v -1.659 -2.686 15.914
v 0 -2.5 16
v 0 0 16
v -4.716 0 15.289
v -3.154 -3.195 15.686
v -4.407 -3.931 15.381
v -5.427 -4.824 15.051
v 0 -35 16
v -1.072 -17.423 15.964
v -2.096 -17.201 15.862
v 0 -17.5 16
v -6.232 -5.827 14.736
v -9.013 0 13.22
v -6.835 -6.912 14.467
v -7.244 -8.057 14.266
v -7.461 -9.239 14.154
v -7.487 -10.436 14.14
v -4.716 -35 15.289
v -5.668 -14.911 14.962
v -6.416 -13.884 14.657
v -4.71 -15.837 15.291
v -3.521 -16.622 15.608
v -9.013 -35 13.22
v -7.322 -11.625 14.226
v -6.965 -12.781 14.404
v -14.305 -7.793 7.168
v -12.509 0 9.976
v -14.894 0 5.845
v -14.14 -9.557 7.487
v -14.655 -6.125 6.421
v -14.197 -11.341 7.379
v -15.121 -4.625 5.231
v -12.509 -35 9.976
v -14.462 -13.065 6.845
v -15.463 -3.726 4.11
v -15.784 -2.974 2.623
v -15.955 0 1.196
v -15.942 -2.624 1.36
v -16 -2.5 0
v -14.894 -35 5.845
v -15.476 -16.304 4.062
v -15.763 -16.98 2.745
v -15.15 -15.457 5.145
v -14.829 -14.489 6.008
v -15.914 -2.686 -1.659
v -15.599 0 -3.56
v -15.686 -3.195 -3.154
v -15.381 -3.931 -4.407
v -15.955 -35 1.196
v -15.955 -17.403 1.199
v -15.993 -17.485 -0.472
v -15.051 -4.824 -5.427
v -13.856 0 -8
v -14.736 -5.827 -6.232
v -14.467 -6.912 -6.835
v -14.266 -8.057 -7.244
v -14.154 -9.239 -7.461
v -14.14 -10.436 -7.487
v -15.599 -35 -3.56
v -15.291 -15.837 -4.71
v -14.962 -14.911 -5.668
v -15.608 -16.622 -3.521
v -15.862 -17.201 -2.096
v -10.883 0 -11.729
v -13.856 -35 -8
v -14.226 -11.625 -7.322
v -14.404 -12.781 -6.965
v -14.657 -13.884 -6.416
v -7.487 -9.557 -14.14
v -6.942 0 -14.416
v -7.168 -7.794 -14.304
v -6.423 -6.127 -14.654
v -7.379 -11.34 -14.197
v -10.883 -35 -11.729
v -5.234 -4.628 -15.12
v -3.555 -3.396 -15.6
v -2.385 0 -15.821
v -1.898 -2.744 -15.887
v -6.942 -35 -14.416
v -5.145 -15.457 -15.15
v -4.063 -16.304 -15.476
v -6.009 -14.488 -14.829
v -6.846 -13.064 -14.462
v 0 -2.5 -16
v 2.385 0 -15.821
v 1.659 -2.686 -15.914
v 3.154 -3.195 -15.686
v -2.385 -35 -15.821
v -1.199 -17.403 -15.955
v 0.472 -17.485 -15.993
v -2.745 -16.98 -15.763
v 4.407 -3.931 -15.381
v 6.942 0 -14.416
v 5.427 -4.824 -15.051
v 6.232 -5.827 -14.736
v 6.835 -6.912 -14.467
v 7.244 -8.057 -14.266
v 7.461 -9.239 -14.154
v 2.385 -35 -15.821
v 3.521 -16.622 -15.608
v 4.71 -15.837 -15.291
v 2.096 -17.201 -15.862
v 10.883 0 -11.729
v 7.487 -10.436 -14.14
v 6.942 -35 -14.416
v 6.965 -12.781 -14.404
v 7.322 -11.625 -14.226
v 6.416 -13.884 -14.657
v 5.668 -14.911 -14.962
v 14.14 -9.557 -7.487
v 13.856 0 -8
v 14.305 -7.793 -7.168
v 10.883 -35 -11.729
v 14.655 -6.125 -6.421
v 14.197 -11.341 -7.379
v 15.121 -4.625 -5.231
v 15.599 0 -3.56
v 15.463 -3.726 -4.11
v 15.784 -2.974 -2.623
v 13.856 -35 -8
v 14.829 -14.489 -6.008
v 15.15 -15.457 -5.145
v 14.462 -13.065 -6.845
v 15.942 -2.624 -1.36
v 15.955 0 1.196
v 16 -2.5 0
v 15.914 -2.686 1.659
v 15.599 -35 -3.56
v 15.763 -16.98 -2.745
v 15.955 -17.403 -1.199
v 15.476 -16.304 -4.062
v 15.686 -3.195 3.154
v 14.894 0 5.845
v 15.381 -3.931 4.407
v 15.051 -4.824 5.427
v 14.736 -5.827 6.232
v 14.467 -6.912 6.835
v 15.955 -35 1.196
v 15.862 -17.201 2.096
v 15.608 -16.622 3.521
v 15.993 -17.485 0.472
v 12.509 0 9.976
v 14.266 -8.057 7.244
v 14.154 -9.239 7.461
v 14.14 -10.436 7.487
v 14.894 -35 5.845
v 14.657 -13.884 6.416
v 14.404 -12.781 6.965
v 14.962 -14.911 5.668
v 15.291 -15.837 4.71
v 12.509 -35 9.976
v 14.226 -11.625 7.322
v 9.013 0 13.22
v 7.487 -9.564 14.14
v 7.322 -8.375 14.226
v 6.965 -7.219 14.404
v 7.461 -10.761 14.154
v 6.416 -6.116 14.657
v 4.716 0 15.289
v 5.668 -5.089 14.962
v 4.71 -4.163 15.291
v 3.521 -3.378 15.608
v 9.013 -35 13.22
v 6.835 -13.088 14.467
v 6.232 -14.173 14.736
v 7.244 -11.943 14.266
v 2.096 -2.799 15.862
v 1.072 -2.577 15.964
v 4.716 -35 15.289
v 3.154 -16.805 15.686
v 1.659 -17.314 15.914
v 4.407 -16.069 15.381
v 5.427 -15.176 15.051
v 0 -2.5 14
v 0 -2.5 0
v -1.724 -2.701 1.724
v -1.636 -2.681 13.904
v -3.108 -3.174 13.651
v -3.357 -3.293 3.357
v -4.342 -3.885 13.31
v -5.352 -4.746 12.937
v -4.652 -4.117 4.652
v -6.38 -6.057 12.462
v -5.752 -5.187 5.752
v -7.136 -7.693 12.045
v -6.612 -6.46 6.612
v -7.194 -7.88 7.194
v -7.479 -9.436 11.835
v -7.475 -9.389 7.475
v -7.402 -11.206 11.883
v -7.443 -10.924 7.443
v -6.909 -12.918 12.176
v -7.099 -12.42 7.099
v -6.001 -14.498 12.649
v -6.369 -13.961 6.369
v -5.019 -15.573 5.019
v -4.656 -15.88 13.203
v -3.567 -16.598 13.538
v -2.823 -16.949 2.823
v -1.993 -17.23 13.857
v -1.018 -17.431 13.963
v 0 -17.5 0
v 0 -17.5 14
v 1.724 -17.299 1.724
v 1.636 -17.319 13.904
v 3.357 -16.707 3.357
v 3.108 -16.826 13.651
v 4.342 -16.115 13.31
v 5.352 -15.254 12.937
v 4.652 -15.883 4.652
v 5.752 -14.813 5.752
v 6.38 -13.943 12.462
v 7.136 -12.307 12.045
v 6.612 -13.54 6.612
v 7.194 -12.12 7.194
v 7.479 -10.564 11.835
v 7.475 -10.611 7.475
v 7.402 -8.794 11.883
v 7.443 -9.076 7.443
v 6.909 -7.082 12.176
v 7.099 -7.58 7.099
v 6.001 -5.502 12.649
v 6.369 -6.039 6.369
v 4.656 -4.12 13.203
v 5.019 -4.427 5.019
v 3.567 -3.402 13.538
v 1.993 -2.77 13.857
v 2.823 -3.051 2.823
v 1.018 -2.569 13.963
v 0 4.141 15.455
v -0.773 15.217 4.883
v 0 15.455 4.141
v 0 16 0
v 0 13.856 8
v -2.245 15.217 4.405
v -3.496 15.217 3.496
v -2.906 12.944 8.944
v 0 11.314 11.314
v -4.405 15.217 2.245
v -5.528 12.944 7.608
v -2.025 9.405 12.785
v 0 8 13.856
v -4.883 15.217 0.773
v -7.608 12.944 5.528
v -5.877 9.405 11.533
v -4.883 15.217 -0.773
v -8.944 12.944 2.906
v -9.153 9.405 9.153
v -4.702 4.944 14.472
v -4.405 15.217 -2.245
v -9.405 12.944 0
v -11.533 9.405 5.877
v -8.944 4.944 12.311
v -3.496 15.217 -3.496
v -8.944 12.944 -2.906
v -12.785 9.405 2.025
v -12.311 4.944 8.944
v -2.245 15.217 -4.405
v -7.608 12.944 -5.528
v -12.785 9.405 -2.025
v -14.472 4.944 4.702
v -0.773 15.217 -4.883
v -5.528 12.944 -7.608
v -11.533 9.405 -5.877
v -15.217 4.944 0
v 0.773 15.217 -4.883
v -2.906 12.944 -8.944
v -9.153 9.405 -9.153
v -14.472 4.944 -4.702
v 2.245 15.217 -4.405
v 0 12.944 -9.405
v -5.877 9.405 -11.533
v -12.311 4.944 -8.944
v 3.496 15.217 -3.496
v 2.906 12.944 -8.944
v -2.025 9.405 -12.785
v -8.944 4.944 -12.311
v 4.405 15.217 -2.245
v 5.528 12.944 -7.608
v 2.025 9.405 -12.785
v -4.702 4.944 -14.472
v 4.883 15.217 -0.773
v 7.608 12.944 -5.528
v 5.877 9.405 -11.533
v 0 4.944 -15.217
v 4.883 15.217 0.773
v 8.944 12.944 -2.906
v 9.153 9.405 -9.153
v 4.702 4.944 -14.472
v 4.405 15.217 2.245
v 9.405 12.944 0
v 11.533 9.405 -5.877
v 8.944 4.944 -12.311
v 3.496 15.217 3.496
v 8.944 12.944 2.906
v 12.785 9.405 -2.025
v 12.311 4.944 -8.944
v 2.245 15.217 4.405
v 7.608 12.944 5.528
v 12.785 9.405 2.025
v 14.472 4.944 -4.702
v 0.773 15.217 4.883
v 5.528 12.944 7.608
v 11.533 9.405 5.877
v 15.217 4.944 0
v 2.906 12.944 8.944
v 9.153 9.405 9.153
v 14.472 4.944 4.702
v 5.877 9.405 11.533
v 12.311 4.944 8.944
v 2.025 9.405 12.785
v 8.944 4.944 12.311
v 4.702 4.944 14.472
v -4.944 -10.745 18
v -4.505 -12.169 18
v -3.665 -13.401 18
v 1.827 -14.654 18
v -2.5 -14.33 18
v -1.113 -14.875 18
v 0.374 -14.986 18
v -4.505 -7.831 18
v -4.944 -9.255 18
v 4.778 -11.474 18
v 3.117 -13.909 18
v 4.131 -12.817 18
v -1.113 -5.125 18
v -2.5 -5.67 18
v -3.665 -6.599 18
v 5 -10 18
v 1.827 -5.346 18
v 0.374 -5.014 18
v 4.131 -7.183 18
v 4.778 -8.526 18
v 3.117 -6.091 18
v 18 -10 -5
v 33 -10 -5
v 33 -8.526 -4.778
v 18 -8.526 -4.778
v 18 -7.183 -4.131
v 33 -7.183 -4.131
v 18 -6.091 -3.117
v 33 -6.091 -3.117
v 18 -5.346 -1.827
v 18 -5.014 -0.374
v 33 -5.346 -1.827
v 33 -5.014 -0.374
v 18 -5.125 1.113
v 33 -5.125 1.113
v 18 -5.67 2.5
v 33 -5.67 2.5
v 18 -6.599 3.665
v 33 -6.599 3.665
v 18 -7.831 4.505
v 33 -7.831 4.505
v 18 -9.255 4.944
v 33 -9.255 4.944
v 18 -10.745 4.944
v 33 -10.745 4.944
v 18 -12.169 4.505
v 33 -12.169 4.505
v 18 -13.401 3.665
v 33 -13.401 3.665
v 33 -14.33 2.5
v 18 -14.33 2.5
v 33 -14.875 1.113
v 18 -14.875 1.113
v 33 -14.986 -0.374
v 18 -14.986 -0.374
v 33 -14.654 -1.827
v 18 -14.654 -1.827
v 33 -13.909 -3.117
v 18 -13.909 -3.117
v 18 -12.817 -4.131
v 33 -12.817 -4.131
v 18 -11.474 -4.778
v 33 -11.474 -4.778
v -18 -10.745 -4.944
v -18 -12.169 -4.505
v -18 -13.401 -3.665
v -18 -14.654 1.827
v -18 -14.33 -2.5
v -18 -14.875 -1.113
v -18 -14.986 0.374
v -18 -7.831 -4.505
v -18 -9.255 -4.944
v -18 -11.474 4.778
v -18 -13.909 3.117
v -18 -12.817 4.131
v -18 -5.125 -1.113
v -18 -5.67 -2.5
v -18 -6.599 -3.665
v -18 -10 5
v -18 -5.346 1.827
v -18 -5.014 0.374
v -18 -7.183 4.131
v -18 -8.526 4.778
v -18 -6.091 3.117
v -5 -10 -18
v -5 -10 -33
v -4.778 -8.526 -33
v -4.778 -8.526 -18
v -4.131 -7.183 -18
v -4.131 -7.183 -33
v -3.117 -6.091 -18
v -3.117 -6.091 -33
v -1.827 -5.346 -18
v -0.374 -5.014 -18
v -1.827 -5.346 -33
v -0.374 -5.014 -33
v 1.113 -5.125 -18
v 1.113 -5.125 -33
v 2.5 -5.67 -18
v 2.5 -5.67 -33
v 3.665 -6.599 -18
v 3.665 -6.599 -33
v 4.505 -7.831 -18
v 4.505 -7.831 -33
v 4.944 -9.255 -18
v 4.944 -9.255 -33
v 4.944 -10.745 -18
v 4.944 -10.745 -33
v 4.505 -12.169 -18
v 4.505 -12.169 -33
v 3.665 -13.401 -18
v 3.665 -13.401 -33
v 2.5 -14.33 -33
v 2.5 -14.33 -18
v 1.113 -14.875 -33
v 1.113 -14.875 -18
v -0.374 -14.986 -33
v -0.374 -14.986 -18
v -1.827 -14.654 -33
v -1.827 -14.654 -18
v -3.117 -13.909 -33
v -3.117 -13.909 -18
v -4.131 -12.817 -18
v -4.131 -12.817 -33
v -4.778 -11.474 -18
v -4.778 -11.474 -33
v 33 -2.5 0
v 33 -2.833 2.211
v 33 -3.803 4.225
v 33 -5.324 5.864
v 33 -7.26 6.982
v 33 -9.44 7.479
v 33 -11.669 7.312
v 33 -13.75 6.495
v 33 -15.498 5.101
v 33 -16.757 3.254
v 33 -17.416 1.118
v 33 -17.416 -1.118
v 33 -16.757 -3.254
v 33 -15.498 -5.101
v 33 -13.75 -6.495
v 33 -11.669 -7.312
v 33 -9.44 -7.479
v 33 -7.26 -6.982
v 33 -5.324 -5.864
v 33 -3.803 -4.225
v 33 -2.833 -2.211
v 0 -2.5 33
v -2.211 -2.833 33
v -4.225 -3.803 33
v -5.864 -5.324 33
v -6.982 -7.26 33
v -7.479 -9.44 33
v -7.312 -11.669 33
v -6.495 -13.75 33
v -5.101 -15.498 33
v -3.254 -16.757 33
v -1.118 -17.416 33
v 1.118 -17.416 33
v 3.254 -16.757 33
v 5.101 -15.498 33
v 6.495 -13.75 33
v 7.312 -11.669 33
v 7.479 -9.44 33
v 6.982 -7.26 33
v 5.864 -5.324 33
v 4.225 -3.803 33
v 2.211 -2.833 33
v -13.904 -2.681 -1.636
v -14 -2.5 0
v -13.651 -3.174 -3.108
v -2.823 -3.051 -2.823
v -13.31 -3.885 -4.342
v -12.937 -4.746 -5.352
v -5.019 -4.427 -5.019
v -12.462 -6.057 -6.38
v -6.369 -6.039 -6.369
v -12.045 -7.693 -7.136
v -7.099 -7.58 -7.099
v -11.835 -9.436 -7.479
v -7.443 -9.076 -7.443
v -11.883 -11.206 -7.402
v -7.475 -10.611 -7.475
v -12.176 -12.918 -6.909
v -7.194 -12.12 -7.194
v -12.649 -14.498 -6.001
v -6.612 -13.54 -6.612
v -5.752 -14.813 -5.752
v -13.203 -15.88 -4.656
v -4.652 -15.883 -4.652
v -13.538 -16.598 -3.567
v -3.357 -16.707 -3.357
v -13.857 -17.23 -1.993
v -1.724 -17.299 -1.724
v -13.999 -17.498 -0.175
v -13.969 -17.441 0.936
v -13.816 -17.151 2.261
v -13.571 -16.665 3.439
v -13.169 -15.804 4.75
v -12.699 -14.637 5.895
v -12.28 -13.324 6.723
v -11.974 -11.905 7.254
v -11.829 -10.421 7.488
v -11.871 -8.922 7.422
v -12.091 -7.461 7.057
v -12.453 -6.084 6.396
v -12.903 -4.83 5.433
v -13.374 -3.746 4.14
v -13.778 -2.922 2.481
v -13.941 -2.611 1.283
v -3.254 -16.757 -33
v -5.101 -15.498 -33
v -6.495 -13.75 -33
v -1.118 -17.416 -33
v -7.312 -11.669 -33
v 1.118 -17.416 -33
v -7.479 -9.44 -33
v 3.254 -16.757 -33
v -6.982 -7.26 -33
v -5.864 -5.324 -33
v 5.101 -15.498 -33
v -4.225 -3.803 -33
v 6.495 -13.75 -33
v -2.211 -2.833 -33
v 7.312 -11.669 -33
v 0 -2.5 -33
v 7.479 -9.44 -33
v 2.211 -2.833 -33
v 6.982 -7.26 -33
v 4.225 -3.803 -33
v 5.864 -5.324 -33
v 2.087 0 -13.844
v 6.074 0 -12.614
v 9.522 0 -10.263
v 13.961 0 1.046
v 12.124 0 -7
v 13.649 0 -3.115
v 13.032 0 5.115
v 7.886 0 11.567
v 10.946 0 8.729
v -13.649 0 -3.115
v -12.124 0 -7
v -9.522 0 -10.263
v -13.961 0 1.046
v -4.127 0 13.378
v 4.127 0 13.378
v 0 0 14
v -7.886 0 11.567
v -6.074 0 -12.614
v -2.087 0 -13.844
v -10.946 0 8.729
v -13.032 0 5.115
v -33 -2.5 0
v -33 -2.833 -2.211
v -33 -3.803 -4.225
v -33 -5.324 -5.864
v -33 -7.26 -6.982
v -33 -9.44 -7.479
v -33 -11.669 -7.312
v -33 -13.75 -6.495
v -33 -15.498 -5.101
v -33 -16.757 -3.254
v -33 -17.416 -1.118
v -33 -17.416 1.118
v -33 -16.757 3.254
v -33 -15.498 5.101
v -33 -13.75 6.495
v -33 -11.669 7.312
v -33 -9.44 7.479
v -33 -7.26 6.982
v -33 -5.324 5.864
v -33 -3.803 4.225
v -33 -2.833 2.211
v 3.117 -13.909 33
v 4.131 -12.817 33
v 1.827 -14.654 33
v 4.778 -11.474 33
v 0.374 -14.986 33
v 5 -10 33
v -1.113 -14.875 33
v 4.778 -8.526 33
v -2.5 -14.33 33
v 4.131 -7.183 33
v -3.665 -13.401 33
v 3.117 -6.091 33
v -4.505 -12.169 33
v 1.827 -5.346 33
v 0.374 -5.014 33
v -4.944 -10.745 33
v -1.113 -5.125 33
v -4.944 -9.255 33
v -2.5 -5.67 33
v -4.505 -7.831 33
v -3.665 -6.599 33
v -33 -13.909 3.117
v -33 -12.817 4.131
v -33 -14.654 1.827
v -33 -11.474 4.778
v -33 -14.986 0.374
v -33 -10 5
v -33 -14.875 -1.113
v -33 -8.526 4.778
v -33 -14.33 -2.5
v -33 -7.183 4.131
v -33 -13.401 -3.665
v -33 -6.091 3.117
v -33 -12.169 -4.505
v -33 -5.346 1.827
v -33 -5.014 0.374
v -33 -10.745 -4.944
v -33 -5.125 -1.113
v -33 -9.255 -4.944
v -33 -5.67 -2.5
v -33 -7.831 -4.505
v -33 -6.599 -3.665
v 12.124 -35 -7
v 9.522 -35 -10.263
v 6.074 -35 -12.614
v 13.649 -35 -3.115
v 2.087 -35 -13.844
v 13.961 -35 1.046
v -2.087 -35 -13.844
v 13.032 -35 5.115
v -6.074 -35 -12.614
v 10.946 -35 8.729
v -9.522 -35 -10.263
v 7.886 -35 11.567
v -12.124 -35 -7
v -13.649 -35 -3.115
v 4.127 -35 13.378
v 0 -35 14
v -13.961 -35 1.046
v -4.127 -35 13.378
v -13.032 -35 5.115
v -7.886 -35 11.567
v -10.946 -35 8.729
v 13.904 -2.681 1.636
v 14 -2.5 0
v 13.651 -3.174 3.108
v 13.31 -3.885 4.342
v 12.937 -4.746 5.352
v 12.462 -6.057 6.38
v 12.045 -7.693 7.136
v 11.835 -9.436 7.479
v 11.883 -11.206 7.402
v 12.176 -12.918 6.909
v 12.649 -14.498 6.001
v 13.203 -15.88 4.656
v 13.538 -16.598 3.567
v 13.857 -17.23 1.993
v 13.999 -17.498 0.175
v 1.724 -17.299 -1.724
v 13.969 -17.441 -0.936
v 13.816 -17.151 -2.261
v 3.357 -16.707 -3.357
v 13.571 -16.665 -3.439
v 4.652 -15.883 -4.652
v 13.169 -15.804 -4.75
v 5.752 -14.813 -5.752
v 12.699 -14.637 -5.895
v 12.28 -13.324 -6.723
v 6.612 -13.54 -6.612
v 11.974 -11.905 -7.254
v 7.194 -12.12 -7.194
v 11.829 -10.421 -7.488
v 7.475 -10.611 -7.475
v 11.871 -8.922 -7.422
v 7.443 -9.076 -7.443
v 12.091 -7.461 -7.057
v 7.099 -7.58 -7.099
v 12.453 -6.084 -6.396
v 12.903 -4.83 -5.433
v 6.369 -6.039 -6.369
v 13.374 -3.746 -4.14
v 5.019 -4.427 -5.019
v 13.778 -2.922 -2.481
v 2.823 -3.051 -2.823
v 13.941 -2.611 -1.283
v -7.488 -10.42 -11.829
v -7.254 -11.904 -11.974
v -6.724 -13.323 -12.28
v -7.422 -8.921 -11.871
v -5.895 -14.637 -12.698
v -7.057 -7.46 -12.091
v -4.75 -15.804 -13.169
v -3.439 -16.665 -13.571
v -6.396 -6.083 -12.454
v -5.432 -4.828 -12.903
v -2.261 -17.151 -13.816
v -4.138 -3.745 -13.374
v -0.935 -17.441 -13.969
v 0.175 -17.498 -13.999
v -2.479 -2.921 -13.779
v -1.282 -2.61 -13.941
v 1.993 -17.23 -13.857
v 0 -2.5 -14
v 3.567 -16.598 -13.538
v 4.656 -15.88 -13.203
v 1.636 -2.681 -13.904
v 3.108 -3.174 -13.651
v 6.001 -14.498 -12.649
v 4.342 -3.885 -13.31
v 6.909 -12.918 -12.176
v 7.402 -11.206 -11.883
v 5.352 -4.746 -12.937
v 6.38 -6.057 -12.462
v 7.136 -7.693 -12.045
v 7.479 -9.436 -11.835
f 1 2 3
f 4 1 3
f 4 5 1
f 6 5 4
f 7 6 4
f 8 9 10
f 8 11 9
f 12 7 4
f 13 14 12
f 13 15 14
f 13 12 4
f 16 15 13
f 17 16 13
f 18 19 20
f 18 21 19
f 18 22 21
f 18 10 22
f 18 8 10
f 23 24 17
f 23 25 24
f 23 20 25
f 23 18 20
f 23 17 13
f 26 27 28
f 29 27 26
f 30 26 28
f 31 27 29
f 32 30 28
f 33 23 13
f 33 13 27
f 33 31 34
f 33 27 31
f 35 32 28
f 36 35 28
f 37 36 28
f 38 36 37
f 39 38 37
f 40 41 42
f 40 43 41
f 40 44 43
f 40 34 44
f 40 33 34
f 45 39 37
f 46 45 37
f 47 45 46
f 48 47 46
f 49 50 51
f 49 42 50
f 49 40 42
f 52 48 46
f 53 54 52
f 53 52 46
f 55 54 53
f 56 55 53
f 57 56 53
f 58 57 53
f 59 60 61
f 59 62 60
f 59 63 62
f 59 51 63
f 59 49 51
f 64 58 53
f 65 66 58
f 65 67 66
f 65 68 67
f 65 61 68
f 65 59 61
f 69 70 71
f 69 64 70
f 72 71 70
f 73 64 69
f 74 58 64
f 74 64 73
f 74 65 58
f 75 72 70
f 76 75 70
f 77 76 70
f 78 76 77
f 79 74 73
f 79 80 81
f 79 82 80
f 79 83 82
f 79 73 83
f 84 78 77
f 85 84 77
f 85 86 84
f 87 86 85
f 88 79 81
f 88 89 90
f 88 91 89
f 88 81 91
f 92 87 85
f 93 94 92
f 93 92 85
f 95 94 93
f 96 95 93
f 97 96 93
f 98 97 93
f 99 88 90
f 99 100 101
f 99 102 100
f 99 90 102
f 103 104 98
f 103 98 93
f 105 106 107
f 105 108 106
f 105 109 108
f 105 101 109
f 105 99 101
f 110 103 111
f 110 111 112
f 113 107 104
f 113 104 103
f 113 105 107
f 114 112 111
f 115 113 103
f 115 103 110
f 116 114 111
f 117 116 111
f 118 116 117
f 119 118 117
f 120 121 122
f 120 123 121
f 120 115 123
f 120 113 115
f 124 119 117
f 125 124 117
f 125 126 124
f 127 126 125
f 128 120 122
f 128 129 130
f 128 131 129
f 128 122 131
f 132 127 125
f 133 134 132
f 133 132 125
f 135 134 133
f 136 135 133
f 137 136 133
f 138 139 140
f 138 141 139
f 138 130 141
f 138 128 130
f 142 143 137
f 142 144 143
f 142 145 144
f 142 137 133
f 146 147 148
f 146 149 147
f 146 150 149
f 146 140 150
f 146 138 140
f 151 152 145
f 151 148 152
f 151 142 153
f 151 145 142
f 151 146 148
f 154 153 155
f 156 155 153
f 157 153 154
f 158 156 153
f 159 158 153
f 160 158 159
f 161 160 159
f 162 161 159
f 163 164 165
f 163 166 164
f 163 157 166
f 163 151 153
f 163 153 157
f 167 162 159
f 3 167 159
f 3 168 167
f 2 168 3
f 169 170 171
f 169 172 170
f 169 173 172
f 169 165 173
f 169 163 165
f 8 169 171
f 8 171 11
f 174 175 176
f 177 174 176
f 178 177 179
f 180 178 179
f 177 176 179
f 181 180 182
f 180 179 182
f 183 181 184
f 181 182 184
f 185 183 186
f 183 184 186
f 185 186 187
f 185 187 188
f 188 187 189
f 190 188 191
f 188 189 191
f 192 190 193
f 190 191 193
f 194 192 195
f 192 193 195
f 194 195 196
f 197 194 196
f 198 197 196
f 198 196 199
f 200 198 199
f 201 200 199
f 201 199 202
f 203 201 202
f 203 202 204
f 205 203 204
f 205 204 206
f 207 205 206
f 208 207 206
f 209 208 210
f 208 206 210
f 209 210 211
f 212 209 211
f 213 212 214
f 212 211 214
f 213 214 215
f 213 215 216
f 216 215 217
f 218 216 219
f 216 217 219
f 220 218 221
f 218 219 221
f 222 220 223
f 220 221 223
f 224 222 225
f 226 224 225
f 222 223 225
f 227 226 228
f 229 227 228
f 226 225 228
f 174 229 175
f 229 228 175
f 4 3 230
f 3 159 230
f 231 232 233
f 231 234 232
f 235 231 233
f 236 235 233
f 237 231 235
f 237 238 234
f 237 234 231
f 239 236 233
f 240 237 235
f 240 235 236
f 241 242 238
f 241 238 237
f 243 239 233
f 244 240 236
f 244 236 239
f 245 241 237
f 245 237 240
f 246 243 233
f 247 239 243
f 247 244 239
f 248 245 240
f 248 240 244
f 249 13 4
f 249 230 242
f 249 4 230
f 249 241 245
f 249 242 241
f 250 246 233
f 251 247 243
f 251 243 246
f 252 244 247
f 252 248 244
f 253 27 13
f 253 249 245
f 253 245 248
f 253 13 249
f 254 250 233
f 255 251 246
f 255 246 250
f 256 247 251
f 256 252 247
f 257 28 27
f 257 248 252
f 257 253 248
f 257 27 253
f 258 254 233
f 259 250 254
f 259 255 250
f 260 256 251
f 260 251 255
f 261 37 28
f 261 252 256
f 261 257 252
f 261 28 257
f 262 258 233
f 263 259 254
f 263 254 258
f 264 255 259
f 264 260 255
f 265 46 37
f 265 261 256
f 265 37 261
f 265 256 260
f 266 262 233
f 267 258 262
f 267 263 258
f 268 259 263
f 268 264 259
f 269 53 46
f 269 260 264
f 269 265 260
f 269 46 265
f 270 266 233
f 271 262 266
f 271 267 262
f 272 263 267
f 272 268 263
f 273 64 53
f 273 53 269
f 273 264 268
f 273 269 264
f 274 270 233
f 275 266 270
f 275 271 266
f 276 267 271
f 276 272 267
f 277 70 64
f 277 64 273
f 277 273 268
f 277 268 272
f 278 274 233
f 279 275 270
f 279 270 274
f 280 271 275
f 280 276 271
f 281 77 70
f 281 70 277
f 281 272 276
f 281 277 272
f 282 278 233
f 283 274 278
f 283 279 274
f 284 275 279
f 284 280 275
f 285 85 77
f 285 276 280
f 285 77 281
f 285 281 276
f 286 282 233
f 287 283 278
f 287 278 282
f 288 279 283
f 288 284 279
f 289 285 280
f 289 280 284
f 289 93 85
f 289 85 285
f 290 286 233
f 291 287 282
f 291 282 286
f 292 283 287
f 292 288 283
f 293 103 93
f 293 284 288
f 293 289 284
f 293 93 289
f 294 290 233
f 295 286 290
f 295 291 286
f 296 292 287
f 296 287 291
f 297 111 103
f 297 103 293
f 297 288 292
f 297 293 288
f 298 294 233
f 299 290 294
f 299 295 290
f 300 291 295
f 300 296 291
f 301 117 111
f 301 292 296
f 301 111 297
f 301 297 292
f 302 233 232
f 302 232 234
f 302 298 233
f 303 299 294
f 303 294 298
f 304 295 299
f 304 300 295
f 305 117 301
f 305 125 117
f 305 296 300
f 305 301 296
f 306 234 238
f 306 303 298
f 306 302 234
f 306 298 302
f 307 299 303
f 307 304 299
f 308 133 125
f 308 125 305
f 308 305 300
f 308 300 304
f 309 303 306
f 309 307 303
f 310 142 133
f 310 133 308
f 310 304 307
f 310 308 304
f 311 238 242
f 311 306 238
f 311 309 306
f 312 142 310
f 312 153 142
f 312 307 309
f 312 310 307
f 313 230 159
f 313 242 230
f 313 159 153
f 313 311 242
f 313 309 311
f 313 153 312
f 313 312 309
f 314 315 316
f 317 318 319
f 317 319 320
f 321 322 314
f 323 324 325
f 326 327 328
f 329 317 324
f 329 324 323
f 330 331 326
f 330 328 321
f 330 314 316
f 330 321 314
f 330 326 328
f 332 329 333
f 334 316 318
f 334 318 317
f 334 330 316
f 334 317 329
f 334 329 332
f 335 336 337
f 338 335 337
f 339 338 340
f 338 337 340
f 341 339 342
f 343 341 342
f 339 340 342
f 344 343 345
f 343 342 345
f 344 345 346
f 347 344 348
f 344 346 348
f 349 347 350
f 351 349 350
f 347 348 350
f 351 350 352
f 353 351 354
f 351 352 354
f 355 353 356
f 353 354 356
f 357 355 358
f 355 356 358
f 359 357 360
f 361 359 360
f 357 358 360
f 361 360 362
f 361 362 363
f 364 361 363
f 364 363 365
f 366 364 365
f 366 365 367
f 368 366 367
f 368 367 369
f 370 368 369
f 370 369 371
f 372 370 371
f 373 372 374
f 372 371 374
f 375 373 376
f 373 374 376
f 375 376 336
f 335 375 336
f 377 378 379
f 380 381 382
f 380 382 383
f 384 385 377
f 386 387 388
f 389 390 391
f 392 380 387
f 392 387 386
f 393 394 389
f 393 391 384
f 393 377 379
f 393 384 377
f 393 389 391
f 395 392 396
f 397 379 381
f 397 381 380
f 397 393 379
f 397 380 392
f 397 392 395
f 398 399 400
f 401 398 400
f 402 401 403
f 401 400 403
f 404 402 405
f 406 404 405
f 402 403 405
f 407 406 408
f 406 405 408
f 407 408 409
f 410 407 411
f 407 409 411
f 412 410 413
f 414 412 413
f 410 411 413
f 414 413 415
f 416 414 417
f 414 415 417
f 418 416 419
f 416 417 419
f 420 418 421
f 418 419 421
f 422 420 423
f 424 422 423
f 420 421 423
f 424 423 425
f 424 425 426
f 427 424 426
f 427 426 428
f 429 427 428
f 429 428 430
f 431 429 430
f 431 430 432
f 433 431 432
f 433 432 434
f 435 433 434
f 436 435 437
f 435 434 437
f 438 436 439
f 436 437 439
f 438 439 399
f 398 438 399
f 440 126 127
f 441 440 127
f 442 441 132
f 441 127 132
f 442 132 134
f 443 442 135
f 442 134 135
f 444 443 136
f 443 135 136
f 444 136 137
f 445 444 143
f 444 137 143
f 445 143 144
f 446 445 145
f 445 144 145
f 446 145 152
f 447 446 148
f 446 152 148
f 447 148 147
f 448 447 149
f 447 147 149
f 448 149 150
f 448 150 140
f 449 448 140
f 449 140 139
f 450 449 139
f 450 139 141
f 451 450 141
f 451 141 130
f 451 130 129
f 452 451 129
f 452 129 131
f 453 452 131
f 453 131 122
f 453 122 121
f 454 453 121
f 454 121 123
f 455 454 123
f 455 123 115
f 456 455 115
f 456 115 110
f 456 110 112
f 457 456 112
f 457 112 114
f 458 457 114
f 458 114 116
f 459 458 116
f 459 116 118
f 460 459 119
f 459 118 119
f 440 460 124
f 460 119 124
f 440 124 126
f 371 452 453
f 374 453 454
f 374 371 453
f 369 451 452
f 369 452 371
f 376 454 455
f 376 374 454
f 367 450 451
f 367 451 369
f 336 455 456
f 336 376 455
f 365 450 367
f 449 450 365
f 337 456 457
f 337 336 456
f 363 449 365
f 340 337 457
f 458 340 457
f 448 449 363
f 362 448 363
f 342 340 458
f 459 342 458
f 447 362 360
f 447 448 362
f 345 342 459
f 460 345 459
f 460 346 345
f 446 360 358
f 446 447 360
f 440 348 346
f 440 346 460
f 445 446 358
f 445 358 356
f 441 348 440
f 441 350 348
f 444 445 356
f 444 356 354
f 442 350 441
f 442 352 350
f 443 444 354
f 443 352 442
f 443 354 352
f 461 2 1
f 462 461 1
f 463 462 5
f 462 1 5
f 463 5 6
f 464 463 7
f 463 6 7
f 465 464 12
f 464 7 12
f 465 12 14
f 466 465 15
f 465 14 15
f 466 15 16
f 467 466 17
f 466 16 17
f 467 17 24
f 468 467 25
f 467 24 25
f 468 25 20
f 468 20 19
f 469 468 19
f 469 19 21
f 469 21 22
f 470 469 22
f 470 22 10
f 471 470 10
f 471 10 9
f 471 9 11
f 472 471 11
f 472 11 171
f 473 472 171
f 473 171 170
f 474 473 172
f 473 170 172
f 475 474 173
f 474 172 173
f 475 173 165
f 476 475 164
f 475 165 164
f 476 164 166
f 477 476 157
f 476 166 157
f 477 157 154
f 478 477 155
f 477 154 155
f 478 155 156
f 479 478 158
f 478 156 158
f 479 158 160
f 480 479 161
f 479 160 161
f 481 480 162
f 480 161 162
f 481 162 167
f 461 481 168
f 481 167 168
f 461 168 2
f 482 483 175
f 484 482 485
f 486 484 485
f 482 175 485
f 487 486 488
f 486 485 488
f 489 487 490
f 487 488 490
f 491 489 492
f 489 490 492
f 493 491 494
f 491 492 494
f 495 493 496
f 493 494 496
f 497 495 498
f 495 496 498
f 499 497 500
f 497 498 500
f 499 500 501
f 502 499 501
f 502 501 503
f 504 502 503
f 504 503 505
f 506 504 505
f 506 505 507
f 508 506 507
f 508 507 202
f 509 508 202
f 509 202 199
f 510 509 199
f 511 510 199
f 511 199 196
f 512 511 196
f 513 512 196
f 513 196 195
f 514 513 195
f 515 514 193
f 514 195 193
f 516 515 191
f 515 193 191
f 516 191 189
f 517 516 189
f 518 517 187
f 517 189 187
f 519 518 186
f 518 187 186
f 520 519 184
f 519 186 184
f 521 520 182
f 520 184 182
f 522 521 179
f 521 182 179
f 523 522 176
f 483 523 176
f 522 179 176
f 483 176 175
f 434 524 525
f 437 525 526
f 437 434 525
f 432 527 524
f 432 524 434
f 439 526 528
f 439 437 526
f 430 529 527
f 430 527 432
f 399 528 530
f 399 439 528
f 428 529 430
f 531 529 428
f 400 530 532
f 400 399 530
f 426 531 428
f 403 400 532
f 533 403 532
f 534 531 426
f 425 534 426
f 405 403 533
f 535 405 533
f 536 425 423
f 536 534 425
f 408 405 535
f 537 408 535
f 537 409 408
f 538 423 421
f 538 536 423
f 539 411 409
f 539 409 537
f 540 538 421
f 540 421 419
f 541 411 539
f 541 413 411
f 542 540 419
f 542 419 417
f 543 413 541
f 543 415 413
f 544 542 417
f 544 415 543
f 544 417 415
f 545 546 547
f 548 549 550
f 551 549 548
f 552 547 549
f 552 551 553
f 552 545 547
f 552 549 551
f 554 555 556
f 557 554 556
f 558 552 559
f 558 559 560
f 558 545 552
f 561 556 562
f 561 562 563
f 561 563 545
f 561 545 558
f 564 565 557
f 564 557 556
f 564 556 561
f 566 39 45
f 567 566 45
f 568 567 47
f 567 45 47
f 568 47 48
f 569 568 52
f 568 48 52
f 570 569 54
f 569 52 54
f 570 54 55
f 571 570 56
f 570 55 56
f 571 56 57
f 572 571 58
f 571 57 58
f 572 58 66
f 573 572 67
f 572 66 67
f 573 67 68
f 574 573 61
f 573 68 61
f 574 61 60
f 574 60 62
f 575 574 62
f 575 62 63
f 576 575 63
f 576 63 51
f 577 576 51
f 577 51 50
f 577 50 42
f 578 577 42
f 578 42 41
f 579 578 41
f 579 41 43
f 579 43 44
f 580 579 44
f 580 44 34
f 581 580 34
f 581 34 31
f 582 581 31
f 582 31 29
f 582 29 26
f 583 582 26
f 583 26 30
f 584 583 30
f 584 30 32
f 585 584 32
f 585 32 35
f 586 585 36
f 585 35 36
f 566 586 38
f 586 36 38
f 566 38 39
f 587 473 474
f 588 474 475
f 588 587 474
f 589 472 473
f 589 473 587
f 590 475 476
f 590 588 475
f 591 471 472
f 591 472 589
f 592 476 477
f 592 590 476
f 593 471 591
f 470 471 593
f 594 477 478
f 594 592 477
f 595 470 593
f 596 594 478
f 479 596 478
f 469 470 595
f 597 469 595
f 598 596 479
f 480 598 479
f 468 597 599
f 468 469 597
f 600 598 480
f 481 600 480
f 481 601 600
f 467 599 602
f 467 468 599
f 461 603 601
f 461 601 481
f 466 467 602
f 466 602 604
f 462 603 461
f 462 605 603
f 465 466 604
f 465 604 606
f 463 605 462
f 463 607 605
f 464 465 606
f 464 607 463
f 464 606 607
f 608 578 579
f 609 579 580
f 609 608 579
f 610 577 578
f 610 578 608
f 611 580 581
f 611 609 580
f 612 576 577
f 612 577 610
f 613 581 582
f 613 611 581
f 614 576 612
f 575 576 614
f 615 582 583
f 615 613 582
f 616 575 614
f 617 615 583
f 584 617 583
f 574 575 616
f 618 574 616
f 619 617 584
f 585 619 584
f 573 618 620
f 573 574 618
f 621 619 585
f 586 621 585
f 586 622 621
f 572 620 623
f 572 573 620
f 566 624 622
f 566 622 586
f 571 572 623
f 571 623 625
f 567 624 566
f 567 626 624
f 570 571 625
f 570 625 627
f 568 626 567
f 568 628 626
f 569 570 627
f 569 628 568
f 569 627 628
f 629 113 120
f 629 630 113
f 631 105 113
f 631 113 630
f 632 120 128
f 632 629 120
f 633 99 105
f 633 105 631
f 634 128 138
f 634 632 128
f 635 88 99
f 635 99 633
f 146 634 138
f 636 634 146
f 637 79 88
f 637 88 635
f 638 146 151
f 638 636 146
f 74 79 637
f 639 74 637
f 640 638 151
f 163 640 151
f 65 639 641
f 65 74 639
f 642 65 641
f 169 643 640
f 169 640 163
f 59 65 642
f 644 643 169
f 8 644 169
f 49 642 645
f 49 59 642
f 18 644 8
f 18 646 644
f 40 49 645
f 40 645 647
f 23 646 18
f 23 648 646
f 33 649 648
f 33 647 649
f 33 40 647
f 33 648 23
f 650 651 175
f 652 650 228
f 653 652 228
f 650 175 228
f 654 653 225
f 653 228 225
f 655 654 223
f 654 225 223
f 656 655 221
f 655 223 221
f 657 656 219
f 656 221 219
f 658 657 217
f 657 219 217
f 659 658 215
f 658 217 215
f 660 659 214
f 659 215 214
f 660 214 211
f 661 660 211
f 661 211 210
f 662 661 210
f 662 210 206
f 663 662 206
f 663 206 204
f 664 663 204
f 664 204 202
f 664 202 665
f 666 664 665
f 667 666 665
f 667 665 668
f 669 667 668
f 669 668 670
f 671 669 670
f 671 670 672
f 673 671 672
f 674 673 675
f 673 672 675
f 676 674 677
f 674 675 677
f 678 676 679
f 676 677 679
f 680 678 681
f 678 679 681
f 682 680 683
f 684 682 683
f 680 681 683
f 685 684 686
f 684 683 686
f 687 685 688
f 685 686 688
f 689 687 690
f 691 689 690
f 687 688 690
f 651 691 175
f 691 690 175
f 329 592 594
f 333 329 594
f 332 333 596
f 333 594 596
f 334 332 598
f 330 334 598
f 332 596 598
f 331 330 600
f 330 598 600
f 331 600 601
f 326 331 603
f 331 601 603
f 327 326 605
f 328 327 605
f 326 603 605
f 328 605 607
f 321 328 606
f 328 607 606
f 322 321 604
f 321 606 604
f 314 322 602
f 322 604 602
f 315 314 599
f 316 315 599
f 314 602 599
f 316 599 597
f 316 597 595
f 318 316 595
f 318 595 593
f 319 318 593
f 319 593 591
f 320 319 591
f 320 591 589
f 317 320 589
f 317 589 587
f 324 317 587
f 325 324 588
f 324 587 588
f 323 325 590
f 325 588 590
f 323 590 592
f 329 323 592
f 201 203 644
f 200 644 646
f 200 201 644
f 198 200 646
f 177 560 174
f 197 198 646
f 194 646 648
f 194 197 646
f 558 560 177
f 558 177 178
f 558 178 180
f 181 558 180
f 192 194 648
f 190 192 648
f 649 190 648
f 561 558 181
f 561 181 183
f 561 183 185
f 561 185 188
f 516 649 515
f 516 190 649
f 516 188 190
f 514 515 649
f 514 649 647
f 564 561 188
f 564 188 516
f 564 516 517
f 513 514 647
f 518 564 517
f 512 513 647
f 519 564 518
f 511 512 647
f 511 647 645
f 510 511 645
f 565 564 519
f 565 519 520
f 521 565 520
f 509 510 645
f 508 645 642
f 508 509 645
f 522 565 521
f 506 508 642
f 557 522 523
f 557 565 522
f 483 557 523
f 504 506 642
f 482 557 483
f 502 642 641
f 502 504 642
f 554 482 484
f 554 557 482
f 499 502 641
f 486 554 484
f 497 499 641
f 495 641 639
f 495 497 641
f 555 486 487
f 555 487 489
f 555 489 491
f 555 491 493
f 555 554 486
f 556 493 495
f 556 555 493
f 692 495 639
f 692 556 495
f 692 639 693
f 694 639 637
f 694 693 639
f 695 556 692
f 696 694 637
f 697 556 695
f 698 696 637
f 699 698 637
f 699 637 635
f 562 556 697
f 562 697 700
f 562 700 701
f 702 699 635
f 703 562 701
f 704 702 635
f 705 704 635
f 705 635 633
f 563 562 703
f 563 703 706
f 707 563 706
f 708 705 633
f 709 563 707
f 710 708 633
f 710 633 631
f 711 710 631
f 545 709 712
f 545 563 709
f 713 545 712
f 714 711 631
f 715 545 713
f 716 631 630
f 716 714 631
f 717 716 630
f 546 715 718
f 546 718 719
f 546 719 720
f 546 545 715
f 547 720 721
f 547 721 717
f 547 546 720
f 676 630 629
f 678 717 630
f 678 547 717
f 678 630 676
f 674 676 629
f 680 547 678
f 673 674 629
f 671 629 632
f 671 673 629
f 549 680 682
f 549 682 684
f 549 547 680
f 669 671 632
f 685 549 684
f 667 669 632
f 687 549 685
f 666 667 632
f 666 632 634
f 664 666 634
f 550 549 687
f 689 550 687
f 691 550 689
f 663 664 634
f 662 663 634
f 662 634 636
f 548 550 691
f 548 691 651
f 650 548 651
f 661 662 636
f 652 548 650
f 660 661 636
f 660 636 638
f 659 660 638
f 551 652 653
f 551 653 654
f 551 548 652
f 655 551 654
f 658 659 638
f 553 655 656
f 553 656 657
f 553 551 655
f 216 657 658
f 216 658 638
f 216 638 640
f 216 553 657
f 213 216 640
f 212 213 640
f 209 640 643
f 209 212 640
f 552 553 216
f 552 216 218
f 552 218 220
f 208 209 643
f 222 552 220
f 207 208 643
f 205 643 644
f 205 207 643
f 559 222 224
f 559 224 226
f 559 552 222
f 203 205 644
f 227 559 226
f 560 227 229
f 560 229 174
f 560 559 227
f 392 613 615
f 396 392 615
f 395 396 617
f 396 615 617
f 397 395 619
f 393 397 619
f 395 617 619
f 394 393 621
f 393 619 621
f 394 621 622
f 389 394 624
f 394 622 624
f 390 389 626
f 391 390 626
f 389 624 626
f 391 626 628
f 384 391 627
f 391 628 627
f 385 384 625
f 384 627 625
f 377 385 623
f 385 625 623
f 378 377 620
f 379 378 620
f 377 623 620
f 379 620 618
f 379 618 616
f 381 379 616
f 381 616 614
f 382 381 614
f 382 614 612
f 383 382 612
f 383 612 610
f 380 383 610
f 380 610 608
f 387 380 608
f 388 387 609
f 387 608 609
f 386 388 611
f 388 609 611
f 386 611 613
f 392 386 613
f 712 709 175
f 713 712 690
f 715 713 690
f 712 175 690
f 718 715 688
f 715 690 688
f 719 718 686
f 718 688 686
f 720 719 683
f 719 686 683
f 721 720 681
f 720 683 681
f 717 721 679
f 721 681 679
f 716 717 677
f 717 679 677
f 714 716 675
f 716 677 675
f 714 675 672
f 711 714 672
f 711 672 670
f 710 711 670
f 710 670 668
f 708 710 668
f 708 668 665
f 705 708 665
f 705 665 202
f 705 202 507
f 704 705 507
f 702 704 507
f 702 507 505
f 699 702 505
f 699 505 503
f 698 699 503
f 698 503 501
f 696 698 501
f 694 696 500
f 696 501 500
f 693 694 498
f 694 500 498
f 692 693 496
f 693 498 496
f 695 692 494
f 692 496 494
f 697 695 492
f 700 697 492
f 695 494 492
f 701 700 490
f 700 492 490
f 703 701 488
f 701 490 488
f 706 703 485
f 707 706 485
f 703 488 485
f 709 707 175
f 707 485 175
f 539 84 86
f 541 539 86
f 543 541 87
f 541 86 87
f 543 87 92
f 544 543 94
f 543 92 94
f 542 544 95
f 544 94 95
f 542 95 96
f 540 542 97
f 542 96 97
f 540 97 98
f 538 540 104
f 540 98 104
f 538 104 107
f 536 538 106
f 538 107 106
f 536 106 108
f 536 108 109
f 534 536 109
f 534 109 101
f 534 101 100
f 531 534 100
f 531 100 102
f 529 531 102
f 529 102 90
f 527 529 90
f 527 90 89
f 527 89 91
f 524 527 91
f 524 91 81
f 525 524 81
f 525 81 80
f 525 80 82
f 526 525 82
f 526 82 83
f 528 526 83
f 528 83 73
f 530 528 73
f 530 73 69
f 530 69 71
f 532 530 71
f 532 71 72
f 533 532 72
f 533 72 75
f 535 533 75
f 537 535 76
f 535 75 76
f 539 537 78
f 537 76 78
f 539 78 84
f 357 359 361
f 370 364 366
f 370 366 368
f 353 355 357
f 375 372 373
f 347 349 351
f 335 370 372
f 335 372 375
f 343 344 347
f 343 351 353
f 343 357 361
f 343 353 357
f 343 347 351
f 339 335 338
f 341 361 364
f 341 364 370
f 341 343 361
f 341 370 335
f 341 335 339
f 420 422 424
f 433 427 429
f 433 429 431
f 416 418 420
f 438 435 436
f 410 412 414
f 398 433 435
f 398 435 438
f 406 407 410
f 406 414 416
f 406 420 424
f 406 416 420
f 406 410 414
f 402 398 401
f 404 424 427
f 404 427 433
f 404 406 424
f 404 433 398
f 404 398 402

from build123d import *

# Parameters (mm, degrees)
SKETCH_3_R               = 7.5
EXTRUDE_2_DEPTH          = 33
SKETCH_4_R               = 5
CUT_EXTRUDE_1_DEPTH      = 15
PATTERN_CIRCULAR_2_COUNT = 4


with BuildPart() as part:
    # 草图2 → 旋转2 (revolve)
    with BuildSketch(Plane.XY, mode=Mode.PRIVATE) as revolve_2_sk:
        with BuildLine():
            Line((-16, 0), (-16, -35))
            Line((-16, -35), (-14, -35))
            Line((-14, -35), (-14, 0))
            Line((-14, 0), (0, 0))
            Line((0, 0), (0, 16))
            ThreePointArc((0, 16), (-11.313708499, 11.313708499), (-16, 0))
        make_face()
    revolve(revolve_2_sk.sketch.rotate(Axis((0, 0, 0), (0, -1, 0)), 270), axis=Axis((0, 0, 0), (0, -1, 0)))

    # 草图3 → 凸台-拉伸2 (add)
    with BuildSketch(Plane.XY):
        with Locations(Location((0, -10, 0), (0, 0, 90.000000001))):
            Circle(SKETCH_3_R)
    extrude_2 = extrude(amount=EXTRUDE_2_DEPTH)

    # 草图4 → 切除-拉伸1 (cut)
    with BuildSketch(Plane.XY.offset(33)):
        with Locations((0, -10)):
            Circle(SKETCH_4_R)
    cut_extrude_1 = extrude(amount=-CUT_EXTRUDE_1_DEPTH, mode=Mode.SUBTRACT)

    # 阵列(圆周)2: 凸台-拉伸2, 切除-拉伸1 ×4 about axis
    pattern_circular_2_axis = Axis((0, 0, 0), (0, 1, 0))
    add([extrude_2.rotate(pattern_circular_2_axis, i * 360 / PATTERN_CIRCULAR_2_COUNT) for i in range(1, PATTERN_CIRCULAR_2_COUNT)])
    add([cut_extrude_1.rotate(pattern_circular_2_axis, i * 360 / PATTERN_CIRCULAR_2_COUNT) for i in range(1, PATTERN_CIRCULAR_2_COUNT)], mode=Mode.SUBTRACT)


solid = part.part
